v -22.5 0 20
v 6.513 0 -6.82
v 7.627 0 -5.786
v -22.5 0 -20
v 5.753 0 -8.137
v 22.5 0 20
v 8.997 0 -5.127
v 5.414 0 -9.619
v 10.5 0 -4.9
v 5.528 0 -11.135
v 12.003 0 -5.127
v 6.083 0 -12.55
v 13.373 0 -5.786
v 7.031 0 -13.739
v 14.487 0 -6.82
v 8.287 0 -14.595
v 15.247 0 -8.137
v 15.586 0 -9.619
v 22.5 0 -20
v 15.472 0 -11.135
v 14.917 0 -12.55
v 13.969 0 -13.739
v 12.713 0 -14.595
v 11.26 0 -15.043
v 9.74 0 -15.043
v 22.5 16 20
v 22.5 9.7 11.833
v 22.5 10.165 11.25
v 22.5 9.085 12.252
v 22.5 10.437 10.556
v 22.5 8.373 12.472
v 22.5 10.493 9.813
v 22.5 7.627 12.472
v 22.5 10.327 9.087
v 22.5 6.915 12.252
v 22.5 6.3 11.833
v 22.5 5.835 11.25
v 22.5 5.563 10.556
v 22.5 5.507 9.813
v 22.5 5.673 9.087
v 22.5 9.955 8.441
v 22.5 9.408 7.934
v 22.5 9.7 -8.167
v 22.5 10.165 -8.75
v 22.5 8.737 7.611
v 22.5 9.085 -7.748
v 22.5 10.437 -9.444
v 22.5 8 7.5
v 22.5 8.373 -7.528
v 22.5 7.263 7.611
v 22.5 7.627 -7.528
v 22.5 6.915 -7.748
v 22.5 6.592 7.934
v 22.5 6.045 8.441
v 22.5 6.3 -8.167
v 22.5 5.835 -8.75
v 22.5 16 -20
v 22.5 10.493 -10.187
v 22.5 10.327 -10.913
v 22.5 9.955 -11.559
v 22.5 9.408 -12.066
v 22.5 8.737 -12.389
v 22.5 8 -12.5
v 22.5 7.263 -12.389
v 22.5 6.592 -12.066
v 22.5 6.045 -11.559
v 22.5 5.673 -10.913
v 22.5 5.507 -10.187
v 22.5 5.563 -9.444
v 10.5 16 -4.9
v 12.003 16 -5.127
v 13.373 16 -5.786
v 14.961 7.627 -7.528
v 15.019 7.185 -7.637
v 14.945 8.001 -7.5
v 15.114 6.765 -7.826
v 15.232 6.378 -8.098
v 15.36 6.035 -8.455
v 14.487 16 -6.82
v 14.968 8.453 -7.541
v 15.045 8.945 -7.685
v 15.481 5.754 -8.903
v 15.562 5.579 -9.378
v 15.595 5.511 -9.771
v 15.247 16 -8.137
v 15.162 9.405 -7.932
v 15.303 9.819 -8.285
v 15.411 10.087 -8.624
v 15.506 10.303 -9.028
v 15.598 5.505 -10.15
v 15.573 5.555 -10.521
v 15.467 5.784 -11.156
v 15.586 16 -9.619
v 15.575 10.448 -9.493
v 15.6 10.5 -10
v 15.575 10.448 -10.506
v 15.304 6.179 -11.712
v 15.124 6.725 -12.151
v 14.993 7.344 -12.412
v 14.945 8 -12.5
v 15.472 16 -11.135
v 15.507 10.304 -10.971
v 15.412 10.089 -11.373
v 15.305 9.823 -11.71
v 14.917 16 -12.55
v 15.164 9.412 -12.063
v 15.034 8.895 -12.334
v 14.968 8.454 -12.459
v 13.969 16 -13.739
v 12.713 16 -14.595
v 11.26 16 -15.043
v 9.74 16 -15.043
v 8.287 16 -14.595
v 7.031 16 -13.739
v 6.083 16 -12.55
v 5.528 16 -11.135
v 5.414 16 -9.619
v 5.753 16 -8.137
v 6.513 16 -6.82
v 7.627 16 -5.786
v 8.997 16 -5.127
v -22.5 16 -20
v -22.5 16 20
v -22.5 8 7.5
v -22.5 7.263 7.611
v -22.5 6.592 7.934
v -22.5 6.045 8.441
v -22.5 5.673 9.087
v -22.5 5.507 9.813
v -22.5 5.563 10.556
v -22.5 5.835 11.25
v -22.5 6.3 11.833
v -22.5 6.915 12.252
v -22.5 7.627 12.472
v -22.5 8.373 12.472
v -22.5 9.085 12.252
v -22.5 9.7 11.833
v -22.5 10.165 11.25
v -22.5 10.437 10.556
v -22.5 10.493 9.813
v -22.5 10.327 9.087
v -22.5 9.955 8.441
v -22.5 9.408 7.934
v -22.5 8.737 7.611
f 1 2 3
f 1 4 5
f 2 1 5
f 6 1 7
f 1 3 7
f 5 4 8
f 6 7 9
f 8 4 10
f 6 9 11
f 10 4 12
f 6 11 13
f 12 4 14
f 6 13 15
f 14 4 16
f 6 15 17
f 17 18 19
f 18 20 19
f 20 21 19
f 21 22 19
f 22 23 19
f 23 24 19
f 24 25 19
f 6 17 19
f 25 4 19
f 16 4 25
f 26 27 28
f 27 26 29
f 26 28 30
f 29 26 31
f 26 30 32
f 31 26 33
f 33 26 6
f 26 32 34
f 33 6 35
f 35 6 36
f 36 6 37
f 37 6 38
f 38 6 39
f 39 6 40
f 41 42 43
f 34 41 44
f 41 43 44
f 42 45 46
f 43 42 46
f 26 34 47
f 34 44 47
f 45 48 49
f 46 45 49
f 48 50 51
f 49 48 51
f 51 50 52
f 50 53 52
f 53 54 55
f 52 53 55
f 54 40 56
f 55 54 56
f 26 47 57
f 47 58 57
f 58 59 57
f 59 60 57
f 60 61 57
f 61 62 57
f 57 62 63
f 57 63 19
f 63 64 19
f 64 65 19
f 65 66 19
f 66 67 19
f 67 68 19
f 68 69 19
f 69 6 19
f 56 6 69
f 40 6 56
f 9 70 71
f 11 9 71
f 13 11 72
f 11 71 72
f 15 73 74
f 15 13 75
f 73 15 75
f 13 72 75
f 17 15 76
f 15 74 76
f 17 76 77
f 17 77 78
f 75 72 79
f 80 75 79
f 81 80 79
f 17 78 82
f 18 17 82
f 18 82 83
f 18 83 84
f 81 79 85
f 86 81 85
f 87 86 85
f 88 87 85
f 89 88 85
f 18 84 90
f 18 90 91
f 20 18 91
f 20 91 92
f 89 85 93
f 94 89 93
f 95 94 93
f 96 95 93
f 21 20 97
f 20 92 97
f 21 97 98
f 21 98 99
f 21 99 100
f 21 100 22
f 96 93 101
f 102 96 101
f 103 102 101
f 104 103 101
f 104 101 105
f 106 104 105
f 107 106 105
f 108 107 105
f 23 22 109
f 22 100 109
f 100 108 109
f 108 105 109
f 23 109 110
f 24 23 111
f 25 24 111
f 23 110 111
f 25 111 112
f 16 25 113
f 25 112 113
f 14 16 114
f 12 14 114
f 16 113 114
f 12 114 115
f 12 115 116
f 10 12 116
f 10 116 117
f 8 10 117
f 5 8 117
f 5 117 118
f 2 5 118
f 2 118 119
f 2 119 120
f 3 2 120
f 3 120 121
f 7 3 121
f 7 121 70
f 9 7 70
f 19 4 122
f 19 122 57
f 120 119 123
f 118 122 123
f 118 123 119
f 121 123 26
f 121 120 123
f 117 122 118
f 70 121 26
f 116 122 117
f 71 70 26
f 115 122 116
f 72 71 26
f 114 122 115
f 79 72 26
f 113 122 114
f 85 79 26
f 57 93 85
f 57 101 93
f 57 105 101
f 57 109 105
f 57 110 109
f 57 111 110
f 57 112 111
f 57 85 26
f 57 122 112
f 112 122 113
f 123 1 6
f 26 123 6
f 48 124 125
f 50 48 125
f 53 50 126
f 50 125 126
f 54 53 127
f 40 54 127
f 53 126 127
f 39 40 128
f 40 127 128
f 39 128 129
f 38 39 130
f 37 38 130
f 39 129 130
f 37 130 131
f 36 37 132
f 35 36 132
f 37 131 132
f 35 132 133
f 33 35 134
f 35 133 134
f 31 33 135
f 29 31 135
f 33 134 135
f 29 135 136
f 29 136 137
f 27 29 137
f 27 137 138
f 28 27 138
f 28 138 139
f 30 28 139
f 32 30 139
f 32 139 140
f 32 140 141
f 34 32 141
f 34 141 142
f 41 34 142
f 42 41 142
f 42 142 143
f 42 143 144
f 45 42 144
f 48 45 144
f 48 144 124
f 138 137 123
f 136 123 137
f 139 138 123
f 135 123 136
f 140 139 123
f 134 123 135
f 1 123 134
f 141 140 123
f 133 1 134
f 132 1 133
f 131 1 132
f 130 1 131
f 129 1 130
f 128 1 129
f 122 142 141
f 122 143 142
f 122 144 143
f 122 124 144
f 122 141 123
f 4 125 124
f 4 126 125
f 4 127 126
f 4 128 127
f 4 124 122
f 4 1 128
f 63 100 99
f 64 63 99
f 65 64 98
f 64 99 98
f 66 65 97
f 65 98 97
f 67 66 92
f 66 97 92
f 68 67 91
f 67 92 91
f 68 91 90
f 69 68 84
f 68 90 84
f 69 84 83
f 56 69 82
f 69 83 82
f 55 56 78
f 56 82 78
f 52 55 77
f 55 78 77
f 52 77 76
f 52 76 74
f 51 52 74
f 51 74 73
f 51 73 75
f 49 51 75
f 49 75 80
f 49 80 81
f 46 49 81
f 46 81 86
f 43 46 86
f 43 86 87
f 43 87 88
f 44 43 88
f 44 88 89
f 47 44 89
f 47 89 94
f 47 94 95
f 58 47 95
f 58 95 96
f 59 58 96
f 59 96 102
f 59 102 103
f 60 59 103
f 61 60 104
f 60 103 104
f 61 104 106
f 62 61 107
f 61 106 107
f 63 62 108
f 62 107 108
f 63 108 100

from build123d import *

# Parameters (mm, degrees)
SKETCH_1_W             = 45
SKETCH_1_H             = 40
EXTRUDE_1_DEPTH        = 16
HOLE_WIZARD_M6_1_D     = 5
SKETCH_5_R             = 5.1
CUT_EXTRUDE_1_DEPTH    = 50
HOLE_WIZARD_M6_2_D     = 5
HOLE_WIZARD_M6_2_DEPTH = 10
HOLE_WIZARD_M6_2_TIP   = 1.502151548


with BuildPart() as part:
    # 草图1 → 凸台-拉伸1 (new body)
    with BuildSketch(Plane(origin=(0, 0, 0), x_dir=(1, 0, 0), z_dir=(0, 1, 0))):
        Rectangle(SKETCH_1_W, SKETCH_1_H)
    extrude(amount=EXTRUDE_1_DEPTH)

    # M6 螺纹孔1 (through all)
    with Locations(Plane(origin=(22.5, 8, 10), x_dir=(0, 0, 1), z_dir=(1, 0, 0))):
        with Locations((0, 0)):
            Hole(HOLE_WIZARD_M6_1_D / 2)

    # 草图5 → 切除-拉伸1 (cut)
    with BuildSketch(Plane(origin=(0, 16, 0), x_dir=(1, 0, 0), z_dir=(0, 1, 0))):
        with Locations(Location((10.5, 10, 0), (0, 0, 270))):
            Circle(SKETCH_5_R)
    extrude(amount=-CUT_EXTRUDE_1_DEPTH, mode=Mode.SUBTRACT)

    # M6 螺纹孔2
    with Locations(Plane(origin=(22.5, 8, -10), x_dir=(0, 0, 1), z_dir=(1, 0, 0))):
        with Locations((0, 0)):
            Hole(HOLE_WIZARD_M6_2_D / 2, depth=HOLE_WIZARD_M6_2_DEPTH)
            with Locations((0, 0, -(HOLE_WIZARD_M6_2_DEPTH + HOLE_WIZARD_M6_2_TIP / 2))):  # 118° drill point
                Cone(0, HOLE_WIZARD_M6_2_D / 2, HOLE_WIZARD_M6_2_TIP, mode=Mode.SUBTRACT)


solid = part.part
